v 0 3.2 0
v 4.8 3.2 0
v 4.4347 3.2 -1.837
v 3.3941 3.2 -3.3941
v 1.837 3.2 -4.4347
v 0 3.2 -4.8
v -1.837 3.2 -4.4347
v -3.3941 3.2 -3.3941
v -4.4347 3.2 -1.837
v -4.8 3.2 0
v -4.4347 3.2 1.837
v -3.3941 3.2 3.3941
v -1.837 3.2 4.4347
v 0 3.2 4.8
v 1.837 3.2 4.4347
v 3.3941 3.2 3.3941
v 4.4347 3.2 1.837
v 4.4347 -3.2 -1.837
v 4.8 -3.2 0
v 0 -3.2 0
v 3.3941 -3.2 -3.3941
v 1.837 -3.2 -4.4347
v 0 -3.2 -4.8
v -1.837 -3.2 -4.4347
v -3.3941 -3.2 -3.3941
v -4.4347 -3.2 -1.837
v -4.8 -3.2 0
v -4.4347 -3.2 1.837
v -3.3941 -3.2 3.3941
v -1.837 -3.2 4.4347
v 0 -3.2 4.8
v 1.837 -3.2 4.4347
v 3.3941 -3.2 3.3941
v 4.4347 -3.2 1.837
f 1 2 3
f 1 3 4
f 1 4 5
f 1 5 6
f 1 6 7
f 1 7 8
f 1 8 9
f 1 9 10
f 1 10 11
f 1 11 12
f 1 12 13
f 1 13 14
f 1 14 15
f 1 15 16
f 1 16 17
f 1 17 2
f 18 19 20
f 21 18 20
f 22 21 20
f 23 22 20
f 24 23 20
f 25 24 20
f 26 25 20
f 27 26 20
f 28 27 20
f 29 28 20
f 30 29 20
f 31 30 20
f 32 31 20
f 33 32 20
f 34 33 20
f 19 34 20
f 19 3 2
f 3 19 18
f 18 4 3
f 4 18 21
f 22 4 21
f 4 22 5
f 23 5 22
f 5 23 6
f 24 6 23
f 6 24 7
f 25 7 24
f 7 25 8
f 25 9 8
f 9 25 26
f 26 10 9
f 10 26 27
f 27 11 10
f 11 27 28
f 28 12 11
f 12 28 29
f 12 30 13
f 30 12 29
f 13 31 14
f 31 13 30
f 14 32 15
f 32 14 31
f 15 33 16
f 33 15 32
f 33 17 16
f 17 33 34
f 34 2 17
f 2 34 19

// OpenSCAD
// file: ../p/stud3.scad
use <../lib.scad>
use <4-4cyli.scad>
use <4-4disc.scad>
use <4-4edge.scad>
$fa=1; $fs=0.2;
function ldraw_lib__stud3(realsolid=false) = realsolid ? 
    [openscad(translate([0,0,-eps()], o=cylinder(4+eps(), r=4)),2)] : [
// 0 Stud Tube Solid
// 0 Name: stud3.dat
// 0 Author: James Jessiman
// 0 !LDRAW_ORG Primitive UPDATE 2012-01
// 0 !LICENSE Licensed under CC BY 2.0 and CC BY 4.0 : see CAreadme.txt
// 
// 0 BFC CERTIFY CCW
  [0,"BFC","CERTIFY"],
  [0,"BFC","CCW"],
// 
// 0 !HISTORY 2002-04-04 [sbliss] Modified for BFC compliance
// 0 !HISTORY 2002-04-25 [PTadmin] Official Update 2002-02
// 0 !HISTORY 2007-06-24 [PTadmin] Header formatted for Contributor Agreement
// 0 !HISTORY 2008-07-01 [PTadmin] Official Update 2008-01
// 0 !HISTORY 2012-02-16 [Philo] Changed to CCW
// 0 !HISTORY 2012-03-30 [PTadmin] Official Update 2012-01
// 
// 
// 1 16 0 -4 0 4 0 0 0 1 0 0 0 4 4-4edge.dat
  [1,16,0,-4,0,4,0,0,0,1,0,0,0,4, ldraw_lib__4_4edge(realsolid)],
// 1 16 0 0 0 4 0 0 0 1 0 0 0 4 4-4edge.dat
  [1,16,0,0,0,4,0,0,0,1,0,0,0,4, ldraw_lib__4_4edge(realsolid)],
// 1 16 0 -4 0 4 0 0 0 1 0 0 0 4 4-4disc.dat
  [1,16,0,-4,0,4,0,0,0,1,0,0,0,4, ldraw_lib__4_4disc(realsolid)],
// 1 16 0 -4 0 4 0 0 0 4 0 0 0 4 4-4cyli.dat
  [1,16,0,-4,0,4,0,0,0,4,0,0,0,4, ldraw_lib__4_4cyli(realsolid)],
];
module ldraw_lib__stud3(step=0, col=false, unit=2/5, alt=false, line=0.2, solid=!$preview)
    makepoly(ldraw_lib__stud3(solid), step=step, col=col, unit=unit, alt=alt, line=line, solid=solid);
ldraw_lib__stud3(line=0.2);
// file: ../p/stud.scad
use <../lib.scad>
use <4-4cyli.scad>
use <4-4disc.scad>
use <4-4edge.scad>
$fa=1; $fs=0.2;
function ldraw_lib__stud(realsolid=false) = realsolid ? 
    [openscad(translate([0,0,-eps()], o=cylinder(4+eps(), r=6)),2)] : [
// 0 Stud
// 0 Name: stud.dat
// 0 Author: James Jessiman
// 0 !LDRAW_ORG Primitive UPDATE 2012-01
// 0 !LICENSE Licensed under CC BY 2.0 and CC BY 4.0 : see CAreadme.txt
// 
// 0 BFC CERTIFY CCW
  [0,"BFC","CERTIFY"],
  [0,"BFC","CCW"],
// 
// 0 !HISTORY 2002-04-04 [sbliss] Modified for BFC compliance
// 0 !HISTORY 2002-04-25 [PTadmin] Official Update 2002-02
// 0 !HISTORY 2007-06-24 [PTadmin] Header formatted for Contributor Agreement
// 0 !HISTORY 2008-07-01 [PTadmin] Official Update 2008-01
// 0 !HISTORY 2012-02-16 [Philo] Changed to CCW
// 0 !HISTORY 2012-03-30 [PTadmin] Official Update 2012-01
// 
// 
// 1 16 0 0 0 6 0 0 0 1 0 0 0 6 4-4edge.dat
  [1,16,0,0,0,6,0,0,0,1,0,0,0,6, ldraw_lib__4_4edge(realsolid)],
// 1 16 0 -4 0 6 0 0 0 1 0 0 0 6 4-4edge.dat
  [1,16,0,-4,0,6,0,0,0,1,0,0,0,6, ldraw_lib__4_4edge(realsolid)],
// 1 16 0 0 0 6 0 0 0 -4 0 0 0 6 4-4cyli.dat
  [1,16,0,0,0,6,0,0,0,-4,0,0,0,6, ldraw_lib__4_4cyli(realsolid)],
// 1 16 0 -4 0 6 0 0 0 1 0 0 0 6 4-4disc.dat
  [1,16,0,-4,0,6,0,0,0,1,0,0,0,6, ldraw_lib__4_4disc(realsolid)],
];
module ldraw_lib__stud(step=0, col=false, unit=2/5, alt=false, line=0.2, solid=!$preview)
    makepoly(ldraw_lib__stud(solid), step=step, col=col, unit=unit, alt=alt, line=line, solid=solid);
ldraw_lib__stud(line=0.2);
// file: ../p/box5.scad
use <../lib.scad>
$fa=1; $fs=0.2;
function ldraw_lib__box5(realsolid=false) = [
// 0 Box with 5 Faces and All Edges
// 0 Name: box5.dat
// 0 Author: James Jessiman
// 0 !LDRAW_ORG Primitive UPDATE 2012-01
// 0 !LICENSE Licensed under CC BY 2.0 and CC BY 4.0 : see CAreadme.txt
// 
// 0 BFC CERTIFY CCW
  [0,"BFC","CERTIFY"],
  [0,"BFC","CCW"],
// 
// 0 !HISTORY 2002-04-03 [sbliss] Modified for BFC compliance
// 0 !HISTORY 2002-04-25 [PTadmin] Official Update 2002-02
// 0 !HISTORY 2007-06-24 [PTadmin] Header formatted for Contributor Agreement
// 0 !HISTORY 2008-07-01 [PTadmin] Official Update 2008-01
// 0 !HISTORY 2012-02-16 [Philo] Changed to CCW
// 0 !HISTORY 2012-03-30 [PTadmin] Official Update 2012-01
// 
// 
// 2 24 1 1 1 -1 1 1
  [2,24,1,1,1,-1,1,1],
// 2 24 -1 1 1 -1 1 -1
  [2,24,-1,1,1,-1,1,-1],
// 2 24 -1 1 -1 1 1 -1
  [2,24,-1,1,-1,1,1,-1],
// 2 24 1 1 -1 1 1 1
  [2,24,1,1,-1,1,1,1],
// 2 24 1 0 1 -1 0 1
  [2,24,1,0,1,-1,0,1],
// 2 24 -1 0 1 -1 0 -1
  [2,24,-1,0,1,-1,0,-1],
// 2 24 -1 0 -1 1 0 -1
  [2,24,-1,0,-1,1,0,-1],
// 2 24 1 0 -1 1 0 1
  [2,24,1,0,-1,1,0,1],
// 2 24 1 0 1 1 1 1
  [2,24,1,0,1,1,1,1],
// 2 24 -1 0 1 -1 1 1
  [2,24,-1,0,1,-1,1,1],
// 2 24 1 0 -1 1 1 -1
  [2,24,1,0,-1,1,1,-1],
// 2 24 -1 0 -1 -1 1 -1
  [2,24,-1,0,-1,-1,1,-1],
// 4 16 -1 1 1 1 1 1 1 1 -1 -1 1 -1
  [4,16,-1,1,1,1,1,1,1,1,-1,-1,1,-1],
// 4 16 -1 1 1 -1 0 1 1 0 1 1 1 1
  [4,16,-1,1,1,-1,0,1,1,0,1,1,1,1],
// 4 16 -1 1 -1 -1 0 -1 -1 0 1 -1 1 1
  [4,16,-1,1,-1,-1,0,-1,-1,0,1,-1,1,1],
// 4 16 1 1 -1 1 0 -1 -1 0 -1 -1 1 -1
  [4,16,1,1,-1,1,0,-1,-1,0,-1,-1,1,-1],
// 4 16 1 1 1 1 0 1 1 0 -1 1 1 -1
  [4,16,1,1,1,1,0,1,1,0,-1,1,1,-1],
];
module ldraw_lib__box5(step=0, col=false, unit=2/5, alt=false, line=0.2, solid=!$preview)
    makepoly(ldraw_lib__box5(solid), step=step, col=col, unit=unit, alt=alt, line=line, solid=solid);
ldraw_lib__box5(line=0.2);
// file: ../p/box4t.scad
use <../lib.scad>
$fa=1; $fs=0.2;
function ldraw_lib__box4t(realsolid=false) = [
// 0 Box with 4 Adjacent Faces and All Edges
// 0 Name: box4t.dat
// 0 Author: Tore Eriksson [Tore_Eriksson]
// 0 !LDRAW_ORG Primitive UPDATE 2003-02
// 0 !LICENSE Licensed under CC BY 2.0 and CC BY 4.0 : see CAreadme.txt
// 
// 0 BFC CERTIFY CCW
  [0,"BFC","CERTIFY"],
  [0,"BFC","CCW"],
// 
// 0 !HISTORY 1997-09-29 [PTadmin] Official Update 1997-15
// 0 !HISTORY 2002-08-31 [izanette] Modified with WINDZ for BFC compliance
// 0 !HISTORY 2003-08-01 [PTadmin] Official Update 2003-02
// 0 !HISTORY 2007-06-24 [PTadmin] Header formatted for Contributor Agreement
// 0 !HISTORY 2008-07-01 [PTadmin] Official Update 2008-01
// 
// 
// 2 24 1 1 1 -1 1 1
  [2,24,1,1,1,-1,1,1],
// 2 24 -1 1 1 -1 1 -1
  [2,24,-1,1,1,-1,1,-1],
// 2 24 -1 1 -1 1 1 -1
  [2,24,-1,1,-1,1,1,-1],
// 2 24 1 1 -1 1 1 1
  [2,24,1,1,-1,1,1,1],
// 2 24 1 0 1 -1 0 1
  [2,24,1,0,1,-1,0,1],
// 2 24 -1 0 1 -1 0 -1
  [2,24,-1,0,1,-1,0,-1],
// 2 24 -1 0 -1 1 0 -1
  [2,24,-1,0,-1,1,0,-1],
// 2 24 1 0 -1 1 0 1
  [2,24,1,0,-1,1,0,1],
// 2 24 1 0 1 1 1 1
  [2,24,1,0,1,1,1,1],
// 2 24 -1 0 1 -1 1 1
  [2,24,-1,0,1,-1,1,1],
// 2 24 1 0 -1 1 1 -1
  [2,24,1,0,-1,1,1,-1],
// 2 24 -1 0 -1 -1 1 -1
  [2,24,-1,0,-1,-1,1,-1],
// 4 16 1 1 1 1 1 -1 -1 1 -1 -1 1 1
  [4,16,1,1,1,1,1,-1,-1,1,-1,-1,1,1],
// 4 16 1 1 1 -1 1 1 -1 0 1 1 0 1
  [4,16,1,1,1,-1,1,1,-1,0,1,1,0,1],
// 4 16 -1 1 1 -1 1 -1 -1 0 -1 -1 0 1
  [4,16,-1,1,1,-1,1,-1,-1,0,-1,-1,0,1],
// 0 4 16 -1 1 -1 -1 0 -1 1 0 -1 1 1 -1
// 4 16 1 1 -1 1 1 1 1 0 1 1 0 -1
  [4,16,1,1,-1,1,1,1,1,0,1,1,0,-1],
// 0
];
module ldraw_lib__box4t(step=0, col=false, unit=2/5, alt=false, line=0.2, solid=!$preview)
    makepoly(ldraw_lib__box4t(solid), step=step, col=col, unit=unit, alt=alt, line=line, solid=solid);
ldraw_lib__box4t(line=0.2);
// file: s/3004s01.scad
use <../../lib.scad>
use <../../p/box4t.scad>
use <../../p/box5.scad>
use <../../p/stud.scad>
use <../../p/stud3.scad>
$fa=1; $fs=0.2;
function ldraw_lib__s__3004s01(realsolid=false) = [
// 0 ~Brick  1 x  2 without Front Face
// 0 Name: s\3004s01.dat
// 0 Author: James Jessiman
// 0 !LDRAW_ORG Subpart UPDATE 2003-03
// 0 !LICENSE Licensed under CC BY 2.0 and CC BY 4.0 : see CAreadme.txt
// 
// 0 BFC CERTIFY CCW
  [0,"BFC","CERTIFY"],
  [0,"BFC","CCW"],
// 
// 0 !HISTORY 2003-09-07 [jriley] Subfiling, BFC
// 0 !HISTORY 2003-12-19 [PTadmin] Official Update 2003-03
// 0 !HISTORY 2007-08-29 [PTadmin] Header formatted for Contributor Agreement
// 0 !HISTORY 2008-07-01 [PTadmin] Official Update 2008-01
// 
// 
// 1 16 0 4 0 1 0 0 0 -5 0 0 0 1 stud3.dat
  [1,16,0,4,0,1,0,0,0,-5,0,0,0,1, ldraw_lib__stud3(realsolid)],
// 0 BFC INVERTNEXT
  [0,"BFC","INVERTNEXT"],
// 1 16 0 24 0 16 0 0 0 -20 0 0 0 6 box5.dat
  [1,16,0,24,0,16,0,0,0,-20,0,0,0,6, ldraw_lib__box5(realsolid)],
// 4 16 20 24 10 16 24 6 -16 24 6 -20 24 10
  [4,16,20,24,10,16,24,6,-16,24,6,-20,24,10],
// 4 16 -20 24 10 -16 24 6 -16 24 -6 -20 24 -10
  [4,16,-20,24,10,-16,24,6,-16,24,-6,-20,24,-10],
// 4 16 -20 24 -10 -16 24 -6 16 24 -6 20 24 -10
  [4,16,-20,24,-10,-16,24,-6,16,24,-6,20,24,-10],
// 4 16 20 24 -10 16 24 -6 16 24 6 20 24 10
  [4,16,20,24,-10,16,24,-6,16,24,6,20,24,10],
// 1 16 0 24 0 20 0 0 0 -24 0 0 0 10 box4t.dat
  [1,16,0,24,0,20,0,0,0,-24,0,0,0,10, ldraw_lib__box4t(realsolid)],
// 1 16 10 0 0 1 0 0 0 1 0 0 0 1 stud.dat
  [1,16,10,0,0,1,0,0,0,1,0,0,0,1, ldraw_lib__stud(realsolid)],
// 1 16 -10 0 0 1 0 0 0 1 0 0 0 1 stud.dat
  [1,16,-10,0,0,1,0,0,0,1,0,0,0,1, ldraw_lib__stud(realsolid)],
// 0
];
module ldraw_lib__s__3004s01(step=0, col=false, unit=2/5, alt=false, line=0.2, solid=!$preview)
    makepoly(ldraw_lib__s__3004s01(solid), step=step, col=col, unit=unit, alt=alt, line=line, solid=solid);
ldraw_lib__s__3004s01(line=0.2);
// file: ../p/4-4edge.scad
use <../lib.scad>
$fa=1; $fs=0.2;
function ldraw_lib__4_4edge(realsolid=false) = [
// 0 Circle 1.0
// 0 Name: 4-4edge.dat
// 0 Author: James Jessiman
// 0 !LDRAW_ORG Primitive UPDATE 2017-01
// 0 !LICENSE Licensed under CC BY 2.0 and CC BY 4.0 : see CAreadme.txt
// 
// 0 BFC CERTIFY CCW
  [0,"BFC","CERTIFY"],
  [0,"BFC","CCW"],
// 
// 0 !HISTORY 1998-12-15 [PTadmin] Official Update 1998-10
// 0 !HISTORY 2005-12-28 [PTadmin] Official Update 2005-01
// 0 !HISTORY 2007-06-24 [PTadmin] Header formatted for Contributor Agreement
// 0 !HISTORY 2008-07-01 [PTadmin] Official Update 2008-01
// 0 !HISTORY 2017-01-15 [Steffen] BFCed
// 0 !HISTORY 2017-12-30 [PTadmin] Official Update 2017-01
// 
// 
// 2 24 1 0 0 0.9239 0 0.3827
  [2,24,1,0,0,0.9239,0,0.3827],
// 2 24 0.9239 0 0.3827 0.7071 0 0.7071
  [2,24,0.9239,0,0.3827,0.7071,0,0.7071],
// 2 24 0.7071 0 0.7071 0.3827 0 0.9239
  [2,24,0.7071,0,0.7071,0.3827,0,0.9239],
// 2 24 0.3827 0 0.9239 0 0 1
  [2,24,0.3827,0,0.9239,0,0,1],
// 2 24 0 0 1 -0.3827 0 0.9239
  [2,24,0,0,1,-0.3827,0,0.9239],
// 2 24 -0.3827 0 0.9239 -0.7071 0 0.7071
  [2,24,-0.3827,0,0.9239,-0.7071,0,0.7071],
// 2 24 -0.7071 0 0.7071 -0.9239 0 0.3827
  [2,24,-0.7071,0,0.7071,-0.9239,0,0.3827],
// 2 24 -0.9239 0 0.3827 -1 0 -0
  [2,24,-0.9239,0,0.3827,-1,0,-0],
// 2 24 -1 0 -0 -0.9239 0 -0.3827
  [2,24,-1,0,-0,-0.9239,0,-0.3827],
// 2 24 -0.9239 0 -0.3827 -0.7071 0 -0.7071
  [2,24,-0.9239,0,-0.3827,-0.7071,0,-0.7071],
// 2 24 -0.7071 0 -0.7071 -0.3827 0 -0.9239
  [2,24,-0.7071,0,-0.7071,-0.3827,0,-0.9239],
// 2 24 -0.3827 0 -0.9239 0 0 -1
  [2,24,-0.3827,0,-0.9239,0,0,-1],
// 2 24 0 0 -1 0.3827 0 -0.9239
  [2,24,0,0,-1,0.3827,0,-0.9239],
// 2 24 0.3827 0 -0.9239 0.7071 0 -0.7071
  [2,24,0.3827,0,-0.9239,0.7071,0,-0.7071],
// 2 24 0.7071 0 -0.7071 0.9239 0 -0.3827
  [2,24,0.7071,0,-0.7071,0.9239,0,-0.3827],
// 2 24 0.9239 0 -0.3827 1 0 0
  [2,24,0.9239,0,-0.3827,1,0,0],
];
module ldraw_lib__4_4edge(step=0, col=false, unit=2/5, alt=false, line=0.2, solid=!$preview)
    makepoly(ldraw_lib__4_4edge(solid), step=step, col=col, unit=unit, alt=alt, line=line, solid=solid);
ldraw_lib__4_4edge(line=0.2);
// file: ../p/4-4disc.scad
use <../lib.scad>
$fa=1; $fs=0.2;
function ldraw_lib__4_4disc(realsolid=false) = [
// 0 Disc 1.0
// 0 Name: 4-4disc.dat
// 0 Author: James Jessiman
// 0 !LDRAW_ORG Primitive UPDATE 2002-02
// 0 !LICENSE Licensed under CC BY 2.0 and CC BY 4.0 : see CAreadme.txt
// 
// 0 BFC CERTIFY CCW
  [0,"BFC","CERTIFY"],
  [0,"BFC","CCW"],
// 
// 0 !HISTORY 1998-12-15 [PTadmin] Official Update 1998-10
// 0 !HISTORY 2002-03-23 [sbliss] Added BFC statement
// 0 !HISTORY 2002-04-25 [PTadmin] Official Update 2002-02
// 0 !HISTORY 2007-06-24 [PTadmin] Header formatted for Contributor Agreement
// 0 !HISTORY 2008-07-01 [PTadmin] Official Update 2008-01
// 
// 
// 3 16 0 0 0 1 0 0 0.9239 0 0.3827
  [3,16,0,0,0,1,0,0,0.9239,0,0.3827],
// 3 16 0 0 0 0.9239 0 0.3827 0.7071 0 0.7071
  [3,16,0,0,0,0.9239,0,0.3827,0.7071,0,0.7071],
// 3 16 0 0 0 0.7071 0 0.7071 0.3827 0 0.9239
  [3,16,0,0,0,0.7071,0,0.7071,0.3827,0,0.9239],
// 3 16 0 0 0 0.3827 0 0.9239 0 0 1
  [3,16,0,0,0,0.3827,0,0.9239,0,0,1],
// 3 16 0 0 0 0 0 1 -0.3827 0 0.9239
  [3,16,0,0,0,0,0,1,-0.3827,0,0.9239],
// 3 16 0 0 0 -0.3827 0 0.9239 -0.7071 0 0.7071
  [3,16,0,0,0,-0.3827,0,0.9239,-0.7071,0,0.7071],
// 3 16 0 0 0 -0.7071 0 0.7071 -0.9239 0 0.3827
  [3,16,0,0,0,-0.7071,0,0.7071,-0.9239,0,0.3827],
// 3 16 0 0 0 -0.9239 0 0.3827 -1 0 -0
  [3,16,0,0,0,-0.9239,0,0.3827,-1,0,-0],
// 3 16 0 0 0 -1 0 -0 -0.9239 0 -0.3827
  [3,16,0,0,0,-1,0,-0,-0.9239,0,-0.3827],
// 3 16 0 0 0 -0.9239 0 -0.3827 -0.7071 0 -0.7071
  [3,16,0,0,0,-0.9239,0,-0.3827,-0.7071,0,-0.7071],
// 3 16 0 0 0 -0.7071 0 -0.7071 -0.3827 0 -0.9239
  [3,16,0,0,0,-0.7071,0,-0.7071,-0.3827,0,-0.9239],
// 3 16 0 0 0 -0.3827 0 -0.9239 0 0 -1
  [3,16,0,0,0,-0.3827,0,-0.9239,0,0,-1],
// 3 16 0 0 0 0 0 -1 0.3827 0 -0.9239
  [3,16,0,0,0,0,0,-1,0.3827,0,-0.9239],
// 3 16 0 0 0 0.3827 0 -0.9239 0.7071 0 -0.7071
  [3,16,0,0,0,0.3827,0,-0.9239,0.7071,0,-0.7071],
// 3 16 0 0 0 0.7071 0 -0.7071 0.9239 0 -0.3827
  [3,16,0,0,0,0.7071,0,-0.7071,0.9239,0,-0.3827],
// 3 16 0 0 0 0.9239 0 -0.3827 1 0 0
  [3,16,0,0,0,0.9239,0,-0.3827,1,0,0],
// 0
];
module ldraw_lib__4_4disc(step=0, col=false, unit=2/5, alt=false, line=0.2, solid=!$preview)
    makepoly(ldraw_lib__4_4disc(solid), step=step, col=col, unit=unit, alt=alt, line=line, solid=solid);
ldraw_lib__4_4disc(line=0.2);
// file: ../p/4-4cyli.scad
use <../lib.scad>
$fa=1; $fs=0.2;
function ldraw_lib__4_4cyli(realsolid=false) = [
// 0 Cylinder 1.0
// 0 Name: 4-4cyli.dat
// 0 Author: James Jessiman
// 0 !LDRAW_ORG Primitive UPDATE 2005-01
// 0 !LICENSE Licensed under CC BY 2.0 and CC BY 4.0 : see CAreadme.txt
// 
// 0 BFC CERTIFY CCW
  [0,"BFC","CERTIFY"],
  [0,"BFC","CCW"],
// 
// 0 !HISTORY 1998-12-15 [PTadmin] Official Update 1998-10
// 0 !HISTORY 2002-03-23 [sbliss] Added BFC statement; merged headers from files in distributions LDraw 0.27 and Complete.
// 0 !HISTORY 2002-04-25 [PTadmin] Official Update 2002-02
// 0 !HISTORY 2004-12-14 [guyvivan] BFC CCW
// 0 !HISTORY 2005-12-28 [PTadmin] Official Update 2005-01
// 0 !HISTORY 2007-06-24 [PTadmin] Header formatted for Contributor Agreement
// 0 !HISTORY 2008-07-01 [PTadmin] Official Update 2008-01
// 
// 
// 4 16 1 1 0 0.9239 1 0.3827 0.9239 0 0.3827 1 0 0
  [4,16,1,1,0,0.9239,1,0.3827,0.9239,0,0.3827,1,0,0],
// 5 24 1 0 0 1 1 0 0.9239 0 0.3827 0.9239 0 -0.3827
  [5,24,1,0,0,1,1,0,0.9239,0,0.3827,0.9239,0,-0.3827],
// 4 16 0.9239 1 0.3827 0.7071 1 0.7071 0.7071 0 0.7071 0.9239 0 0.3827
  [4,16,0.9239,1,0.3827,0.7071,1,0.7071,0.7071,0,0.7071,0.9239,0,0.3827],
// 5 24 0.9239 0 0.3827 0.9239 1 0.3827 0.7071 0 0.7071 1 0 0
  [5,24,0.9239,0,0.3827,0.9239,1,0.3827,0.7071,0,0.7071,1,0,0],
// 4 16 0.7071 1 0.7071 0.3827 1 0.9239 0.3827 0 0.9239 0.7071 0 0.7071
  [4,16,0.7071,1,0.7071,0.3827,1,0.9239,0.3827,0,0.9239,0.7071,0,0.7071],
// 5 24 0.7071 0 0.7071 0.7071 1 0.7071 0.3827 0 0.9239 0.9239 0 0.3827
  [5,24,0.7071,0,0.7071,0.7071,1,0.7071,0.3827,0,0.9239,0.9239,0,0.3827],
// 4 16 0.3827 1 0.9239 0 1 1 0 0 1 0.3827 0 0.9239
  [4,16,0.3827,1,0.9239,0,1,1,0,0,1,0.3827,0,0.9239],
// 5 24 0.3827 0 0.9239 0.3827 1 0.9239 0 0 1 0.7071 0 0.7071
  [5,24,0.3827,0,0.9239,0.3827,1,0.9239,0,0,1,0.7071,0,0.7071],
// 4 16 0 1 1 -0.3827 1 0.9239 -0.3827 0 0.9239 0 0 1
  [4,16,0,1,1,-0.3827,1,0.9239,-0.3827,0,0.9239,0,0,1],
// 5 24 0 0 1 0 1 1 -0.3827 0 0.9239 0.3827 0 0.9239
  [5,24,0,0,1,0,1,1,-0.3827,0,0.9239,0.3827,0,0.9239],
// 4 16 -0.3827 1 0.9239 -0.7071 1 0.7071 -0.7071 0 0.7071 -0.3827 0 0.9239
  [4,16,-0.3827,1,0.9239,-0.7071,1,0.7071,-0.7071,0,0.7071,-0.3827,0,0.9239],
// 5 24 -0.3827 0 0.9239 -0.3827 1 0.9239 -0.7071 0 0.7071 0 0 1
  [5,24,-0.3827,0,0.9239,-0.3827,1,0.9239,-0.7071,0,0.7071,0,0,1],
// 4 16 -0.7071 1 0.7071 -0.9239 1 0.3827 -0.9239 0 0.3827 -0.7071 0 0.7071
  [4,16,-0.7071,1,0.7071,-0.9239,1,0.3827,-0.9239,0,0.3827,-0.7071,0,0.7071],
// 5 24 -0.7071 0 0.7071 -0.7071 1 0.7071 -0.9239 0 0.3827 -0.3827 0 0.9239
  [5,24,-0.7071,0,0.7071,-0.7071,1,0.7071,-0.9239,0,0.3827,-0.3827,0,0.9239],
// 4 16 -0.9239 1 0.3827 -1 1 0 -1 0 0 -0.9239 0 0.3827
  [4,16,-0.9239,1,0.3827,-1,1,0,-1,0,0,-0.9239,0,0.3827],
// 5 24 -0.9239 0 0.3827 -0.9239 1 0.3827 -1 0 0 -0.7071 0 0.7071
  [5,24,-0.9239,0,0.3827,-0.9239,1,0.3827,-1,0,0,-0.7071,0,0.7071],
// 4 16 -1 1 0 -0.9239 1 -0.3827 -0.9239 0 -0.3827 -1 0 0
  [4,16,-1,1,0,-0.9239,1,-0.3827,-0.9239,0,-0.3827,-1,0,0],
// 5 24 -1 0 0 -1 1 0 -0.9239 0 -0.3827 -0.9239 0 0.3827
  [5,24,-1,0,0,-1,1,0,-0.9239,0,-0.3827,-0.9239,0,0.3827],
// 4 16 -0.9239 1 -0.3827 -0.7071 1 -0.7071 -0.7071 0 -0.7071 -0.9239 0 -0.3827
  [4,16,-0.9239,1,-0.3827,-0.7071,1,-0.7071,-0.7071,0,-0.7071,-0.9239,0,-0.3827],
// 5 24 -0.9239 0 -0.3827 -0.9239 1 -0.3827 -0.7071 0 -0.7071 -1 0 0
  [5,24,-0.9239,0,-0.3827,-0.9239,1,-0.3827,-0.7071,0,-0.7071,-1,0,0],
// 4 16 -0.7071 1 -0.7071 -0.3827 1 -0.9239 -0.3827 0 -0.9239 -0.7071 0 -0.7071
  [4,16,-0.7071,1,-0.7071,-0.3827,1,-0.9239,-0.3827,0,-0.9239,-0.7071,0,-0.7071],
// 5 24 -0.7071 0 -0.7071 -0.7071 1 -0.7071 -0.3827 0 -0.9239 -0.9239 0 -0.3827
  [5,24,-0.7071,0,-0.7071,-0.7071,1,-0.7071,-0.3827,0,-0.9239,-0.9239,0,-0.3827],
// 4 16 -0.3827 1 -0.9239 0 1 -1 0 0 -1 -0.3827 0 -0.9239
  [4,16,-0.3827,1,-0.9239,0,1,-1,0,0,-1,-0.3827,0,-0.9239],
// 5 24 -0.3827 0 -0.9239 -0.3827 1 -0.9239 0 0 -1 -0.7071 0 -0.7071
  [5,24,-0.3827,0,-0.9239,-0.3827,1,-0.9239,0,0,-1,-0.7071,0,-0.7071],
// 4 16 0 1 -1 0.3827 1 -0.9239 0.3827 0 -0.9239 0 0 -1
  [4,16,0,1,-1,0.3827,1,-0.9239,0.3827,0,-0.9239,0,0,-1],
// 5 24 0 0 -1 0 1 -1 0.3827 0 -0.9239 -0.3827 0 -0.9239
  [5,24,0,0,-1,0,1,-1,0.3827,0,-0.9239,-0.3827,0,-0.9239],
// 4 16 0.3827 1 -0.9239 0.7071 1 -0.7071 0.7071 0 -0.7071 0.3827 0 -0.9239
  [4,16,0.3827,1,-0.9239,0.7071,1,-0.7071,0.7071,0,-0.7071,0.3827,0,-0.9239],
// 5 24 0.3827 0 -0.9239 0.3827 1 -0.9239 0.7071 0 -0.7071 0 0 -1
  [5,24,0.3827,0,-0.9239,0.3827,1,-0.9239,0.7071,0,-0.7071,0,0,-1],
// 4 16 0.7071 1 -0.7071 0.9239 1 -0.3827 0.9239 0 -0.3827 0.7071 0 -0.7071
  [4,16,0.7071,1,-0.7071,0.9239,1,-0.3827,0.9239,0,-0.3827,0.7071,0,-0.7071],
// 5 24 0.7071 0 -0.7071 0.7071 1 -0.7071 0.9239 0 -0.3827 0.3827 0 -0.9239
  [5,24,0.7071,0,-0.7071,0.7071,1,-0.7071,0.9239,0,-0.3827,0.3827,0,-0.9239],
// 4 16 0.9239 1 -0.3827 1 1 0 1 0 0 0.9239 0 -0.3827
  [4,16,0.9239,1,-0.3827,1,1,0,1,0,0,0.9239,0,-0.3827],
// 5 24 0.9239 0 -0.3827 0.9239 1 -0.3827 1 0 0 0.7071 0 -0.7071
  [5,24,0.9239,0,-0.3827,0.9239,1,-0.3827,1,0,0,0.7071,0,-0.7071],
// 0
];
module ldraw_lib__4_4cyli(step=0, col=false, unit=2/5, alt=false, line=0.2, solid=!$preview)
    makepoly(ldraw_lib__4_4cyli(solid), step=step, col=col, unit=unit, alt=alt, line=line, solid=solid);
ldraw_lib__4_4cyli(line=0.2);
// file: 3004.scad
use <../lib.scad>
use <s/3004s01.scad>
$fa=1; $fs=0.2;
function ldraw_lib__3004(realsolid=false) = [
// 0 Brick  1 x  2
// 0 Name: 3004.dat
// 0 Author: James Jessiman
// 0 !LDRAW_ORG Part UPDATE 2022-05
// 0 !LICENSE Licensed under CC BY 2.0 and CC BY 4.0 : see CAreadme.txt
// 
// 0 BFC CERTIFY CCW
  [0,"BFC","CERTIFY"],
  [0,"BFC","CCW"],
// 
// 0 !HISTORY 2001-10-26 [PTadmin] Official Update 2001-01
// 0 !HISTORY 2002-05-07 {unknown} BFC Certification
// 0 !HISTORY 2002-06-11 [PTadmin] Official Update 2002-03
// 0 !HISTORY 2007-05-07 [PTadmin] Header formatted for Contributor Agreement
// 0 !HISTORY 2008-07-01 [PTadmin] Official Update 2008-01
// 0 !HISTORY 2022-08-04 [MagFors] Using subfile
// 0 !HISTORY 2022-09-15 [PTadmin] Official Update 2022-05
// 
// 
// 1 16 0 0 0 1 0 0 0 1 0 0 0 1 s\3004s01.dat
  [1,16,0,0,0,1,0,0,0,1,0,0,0,1, ldraw_lib__s__3004s01(realsolid)],
// 4 16 -20 24 -10 20 24 -10 20 0 -10 -20 0 -10
  [4,16,-20,24,-10,20,24,-10,20,0,-10,-20,0,-10],
];
module ldraw_lib__3004(step=0, col=false, unit=2/5, alt=false, line=0.2, solid=!$preview)
    makepoly(ldraw_lib__3004(solid), step=step, col=col, unit=unit, alt=alt, line=line, solid=solid);
ldraw_lib__3004(line=0.2);
// file: 70023.scad
use <../lib.scad>
use <../p/4-4cyli.scad>
use <../p/4-4disc.scad>
use <../p/4-4edge.scad>
$fa=1; $fs=0.2;
function ldraw_lib__70023(realsolid=false) = [
// 0 ~Magnet Cylindrical
// 0 Name: 70023.dat
// 0 Author: Chris Dee [cwdee]
// 0 !LDRAW_ORG Part UPDATE 2012-03
// 0 !LICENSE Licensed under CC BY 2.0 and CC BY 4.0 : see CAreadme.txt
// 
// 0 BFC CERTIFY CW
  [0,"BFC","CERTIFY"],
  [0,"BFC","CW"],
// 
// 0 !HISTORY 2010-07-05 [PTadmin] Official Update 2010-02
// 0 !HISTORY 2012-08-11 [Steffen] Add ~ to title
// 0 !HISTORY 2012-12-28 [PTadmin] Official Update 2012-03
// 
// 
// 1 16 0 0 8 12 0 0 0 0 12 0 -1 0 4-4disc.dat
  [1,16,0,0,8,12,0,0,0,0,12,0,-1,0, ldraw_lib__4_4disc(realsolid)],
// 1 16 0 0 -8 12 0 0 0 0 12 0 1 0 4-4disc.dat
  [1,16,0,0,-8,12,0,0,0,0,12,0,1,0, ldraw_lib__4_4disc(realsolid)],
// 1 16 0 0 8 12 0 0 0 0 12 0 -1 0 4-4edge.dat
  [1,16,0,0,8,12,0,0,0,0,12,0,-1,0, ldraw_lib__4_4edge(realsolid)],
// 1 16 0 0 -8 12 0 0 0 0 12 0 1 0 4-4edge.dat
  [1,16,0,0,-8,12,0,0,0,0,12,0,1,0, ldraw_lib__4_4edge(realsolid)],
// 1 16 0 0 -8 12 0 0 0 0 12 0 16 0 4-4cyli.dat
  [1,16,0,0,-8,12,0,0,0,0,12,0,16,0, ldraw_lib__4_4cyli(realsolid)],
];
module ldraw_lib__70023(step=0, col=false, unit=2/5, alt=false, line=0.2, solid=!$preview)
    makepoly(ldraw_lib__70023(solid), step=step, col=col, unit=unit, alt=alt, line=line, solid=solid);
ldraw_lib__70023(line=0.2);
// main file
use <../lib.scad>
use <70023.scad>
$fa=1; $fs=0.2;
function ldraw_lib__70793(realsolid=false) = [
// 0 =Magnet Cylindrical
// 0 Name: 70793.dat
// 0 Author: [PTadmin]
// 0 !LDRAW_ORG Part Alias UPDATE 2013-02
// 0 !LICENSE Licensed under CC BY 2.0 and CC BY 4.0 : see CAreadme.txt
// 
// 0 BFC CERTIFY CW
  [0,"BFC","CERTIFY"],
  [0,"BFC","CW"],
// 
// 0 !HISTORY 2010-07-05 [PTadmin] Official Update 2010-02
// 0 !HISTORY 2012-08-11 [Steffen] Add ~ to title
// 0 !HISTORY 2012-12-28 [PTadmin] Official Update 2012-03
// 0 !HISTORY 2013-12-14 [cwdee] Add = prefix
// 0 !HISTORY 2013-12-23 [PTadmin] Official Update 2013-02
// 
// 
// 0 // Alias of 70023
// 
// 1 16 0 0 0 1 0 0 0 1 0 0 0 1 70023.dat
  [1,16,0,0,0,1,0,0,0,1,0,0,0,1, ldraw_lib__70023(realsolid)],
];
module ldraw_lib__70793(step=0, col=false, unit=2/5, alt=false, line=0.2, solid=!$preview)
    makepoly(ldraw_lib__70793(solid), step=step, col=col, unit=unit, alt=alt, line=line, solid=solid);
ldraw_lib__70793(line=0.2);
